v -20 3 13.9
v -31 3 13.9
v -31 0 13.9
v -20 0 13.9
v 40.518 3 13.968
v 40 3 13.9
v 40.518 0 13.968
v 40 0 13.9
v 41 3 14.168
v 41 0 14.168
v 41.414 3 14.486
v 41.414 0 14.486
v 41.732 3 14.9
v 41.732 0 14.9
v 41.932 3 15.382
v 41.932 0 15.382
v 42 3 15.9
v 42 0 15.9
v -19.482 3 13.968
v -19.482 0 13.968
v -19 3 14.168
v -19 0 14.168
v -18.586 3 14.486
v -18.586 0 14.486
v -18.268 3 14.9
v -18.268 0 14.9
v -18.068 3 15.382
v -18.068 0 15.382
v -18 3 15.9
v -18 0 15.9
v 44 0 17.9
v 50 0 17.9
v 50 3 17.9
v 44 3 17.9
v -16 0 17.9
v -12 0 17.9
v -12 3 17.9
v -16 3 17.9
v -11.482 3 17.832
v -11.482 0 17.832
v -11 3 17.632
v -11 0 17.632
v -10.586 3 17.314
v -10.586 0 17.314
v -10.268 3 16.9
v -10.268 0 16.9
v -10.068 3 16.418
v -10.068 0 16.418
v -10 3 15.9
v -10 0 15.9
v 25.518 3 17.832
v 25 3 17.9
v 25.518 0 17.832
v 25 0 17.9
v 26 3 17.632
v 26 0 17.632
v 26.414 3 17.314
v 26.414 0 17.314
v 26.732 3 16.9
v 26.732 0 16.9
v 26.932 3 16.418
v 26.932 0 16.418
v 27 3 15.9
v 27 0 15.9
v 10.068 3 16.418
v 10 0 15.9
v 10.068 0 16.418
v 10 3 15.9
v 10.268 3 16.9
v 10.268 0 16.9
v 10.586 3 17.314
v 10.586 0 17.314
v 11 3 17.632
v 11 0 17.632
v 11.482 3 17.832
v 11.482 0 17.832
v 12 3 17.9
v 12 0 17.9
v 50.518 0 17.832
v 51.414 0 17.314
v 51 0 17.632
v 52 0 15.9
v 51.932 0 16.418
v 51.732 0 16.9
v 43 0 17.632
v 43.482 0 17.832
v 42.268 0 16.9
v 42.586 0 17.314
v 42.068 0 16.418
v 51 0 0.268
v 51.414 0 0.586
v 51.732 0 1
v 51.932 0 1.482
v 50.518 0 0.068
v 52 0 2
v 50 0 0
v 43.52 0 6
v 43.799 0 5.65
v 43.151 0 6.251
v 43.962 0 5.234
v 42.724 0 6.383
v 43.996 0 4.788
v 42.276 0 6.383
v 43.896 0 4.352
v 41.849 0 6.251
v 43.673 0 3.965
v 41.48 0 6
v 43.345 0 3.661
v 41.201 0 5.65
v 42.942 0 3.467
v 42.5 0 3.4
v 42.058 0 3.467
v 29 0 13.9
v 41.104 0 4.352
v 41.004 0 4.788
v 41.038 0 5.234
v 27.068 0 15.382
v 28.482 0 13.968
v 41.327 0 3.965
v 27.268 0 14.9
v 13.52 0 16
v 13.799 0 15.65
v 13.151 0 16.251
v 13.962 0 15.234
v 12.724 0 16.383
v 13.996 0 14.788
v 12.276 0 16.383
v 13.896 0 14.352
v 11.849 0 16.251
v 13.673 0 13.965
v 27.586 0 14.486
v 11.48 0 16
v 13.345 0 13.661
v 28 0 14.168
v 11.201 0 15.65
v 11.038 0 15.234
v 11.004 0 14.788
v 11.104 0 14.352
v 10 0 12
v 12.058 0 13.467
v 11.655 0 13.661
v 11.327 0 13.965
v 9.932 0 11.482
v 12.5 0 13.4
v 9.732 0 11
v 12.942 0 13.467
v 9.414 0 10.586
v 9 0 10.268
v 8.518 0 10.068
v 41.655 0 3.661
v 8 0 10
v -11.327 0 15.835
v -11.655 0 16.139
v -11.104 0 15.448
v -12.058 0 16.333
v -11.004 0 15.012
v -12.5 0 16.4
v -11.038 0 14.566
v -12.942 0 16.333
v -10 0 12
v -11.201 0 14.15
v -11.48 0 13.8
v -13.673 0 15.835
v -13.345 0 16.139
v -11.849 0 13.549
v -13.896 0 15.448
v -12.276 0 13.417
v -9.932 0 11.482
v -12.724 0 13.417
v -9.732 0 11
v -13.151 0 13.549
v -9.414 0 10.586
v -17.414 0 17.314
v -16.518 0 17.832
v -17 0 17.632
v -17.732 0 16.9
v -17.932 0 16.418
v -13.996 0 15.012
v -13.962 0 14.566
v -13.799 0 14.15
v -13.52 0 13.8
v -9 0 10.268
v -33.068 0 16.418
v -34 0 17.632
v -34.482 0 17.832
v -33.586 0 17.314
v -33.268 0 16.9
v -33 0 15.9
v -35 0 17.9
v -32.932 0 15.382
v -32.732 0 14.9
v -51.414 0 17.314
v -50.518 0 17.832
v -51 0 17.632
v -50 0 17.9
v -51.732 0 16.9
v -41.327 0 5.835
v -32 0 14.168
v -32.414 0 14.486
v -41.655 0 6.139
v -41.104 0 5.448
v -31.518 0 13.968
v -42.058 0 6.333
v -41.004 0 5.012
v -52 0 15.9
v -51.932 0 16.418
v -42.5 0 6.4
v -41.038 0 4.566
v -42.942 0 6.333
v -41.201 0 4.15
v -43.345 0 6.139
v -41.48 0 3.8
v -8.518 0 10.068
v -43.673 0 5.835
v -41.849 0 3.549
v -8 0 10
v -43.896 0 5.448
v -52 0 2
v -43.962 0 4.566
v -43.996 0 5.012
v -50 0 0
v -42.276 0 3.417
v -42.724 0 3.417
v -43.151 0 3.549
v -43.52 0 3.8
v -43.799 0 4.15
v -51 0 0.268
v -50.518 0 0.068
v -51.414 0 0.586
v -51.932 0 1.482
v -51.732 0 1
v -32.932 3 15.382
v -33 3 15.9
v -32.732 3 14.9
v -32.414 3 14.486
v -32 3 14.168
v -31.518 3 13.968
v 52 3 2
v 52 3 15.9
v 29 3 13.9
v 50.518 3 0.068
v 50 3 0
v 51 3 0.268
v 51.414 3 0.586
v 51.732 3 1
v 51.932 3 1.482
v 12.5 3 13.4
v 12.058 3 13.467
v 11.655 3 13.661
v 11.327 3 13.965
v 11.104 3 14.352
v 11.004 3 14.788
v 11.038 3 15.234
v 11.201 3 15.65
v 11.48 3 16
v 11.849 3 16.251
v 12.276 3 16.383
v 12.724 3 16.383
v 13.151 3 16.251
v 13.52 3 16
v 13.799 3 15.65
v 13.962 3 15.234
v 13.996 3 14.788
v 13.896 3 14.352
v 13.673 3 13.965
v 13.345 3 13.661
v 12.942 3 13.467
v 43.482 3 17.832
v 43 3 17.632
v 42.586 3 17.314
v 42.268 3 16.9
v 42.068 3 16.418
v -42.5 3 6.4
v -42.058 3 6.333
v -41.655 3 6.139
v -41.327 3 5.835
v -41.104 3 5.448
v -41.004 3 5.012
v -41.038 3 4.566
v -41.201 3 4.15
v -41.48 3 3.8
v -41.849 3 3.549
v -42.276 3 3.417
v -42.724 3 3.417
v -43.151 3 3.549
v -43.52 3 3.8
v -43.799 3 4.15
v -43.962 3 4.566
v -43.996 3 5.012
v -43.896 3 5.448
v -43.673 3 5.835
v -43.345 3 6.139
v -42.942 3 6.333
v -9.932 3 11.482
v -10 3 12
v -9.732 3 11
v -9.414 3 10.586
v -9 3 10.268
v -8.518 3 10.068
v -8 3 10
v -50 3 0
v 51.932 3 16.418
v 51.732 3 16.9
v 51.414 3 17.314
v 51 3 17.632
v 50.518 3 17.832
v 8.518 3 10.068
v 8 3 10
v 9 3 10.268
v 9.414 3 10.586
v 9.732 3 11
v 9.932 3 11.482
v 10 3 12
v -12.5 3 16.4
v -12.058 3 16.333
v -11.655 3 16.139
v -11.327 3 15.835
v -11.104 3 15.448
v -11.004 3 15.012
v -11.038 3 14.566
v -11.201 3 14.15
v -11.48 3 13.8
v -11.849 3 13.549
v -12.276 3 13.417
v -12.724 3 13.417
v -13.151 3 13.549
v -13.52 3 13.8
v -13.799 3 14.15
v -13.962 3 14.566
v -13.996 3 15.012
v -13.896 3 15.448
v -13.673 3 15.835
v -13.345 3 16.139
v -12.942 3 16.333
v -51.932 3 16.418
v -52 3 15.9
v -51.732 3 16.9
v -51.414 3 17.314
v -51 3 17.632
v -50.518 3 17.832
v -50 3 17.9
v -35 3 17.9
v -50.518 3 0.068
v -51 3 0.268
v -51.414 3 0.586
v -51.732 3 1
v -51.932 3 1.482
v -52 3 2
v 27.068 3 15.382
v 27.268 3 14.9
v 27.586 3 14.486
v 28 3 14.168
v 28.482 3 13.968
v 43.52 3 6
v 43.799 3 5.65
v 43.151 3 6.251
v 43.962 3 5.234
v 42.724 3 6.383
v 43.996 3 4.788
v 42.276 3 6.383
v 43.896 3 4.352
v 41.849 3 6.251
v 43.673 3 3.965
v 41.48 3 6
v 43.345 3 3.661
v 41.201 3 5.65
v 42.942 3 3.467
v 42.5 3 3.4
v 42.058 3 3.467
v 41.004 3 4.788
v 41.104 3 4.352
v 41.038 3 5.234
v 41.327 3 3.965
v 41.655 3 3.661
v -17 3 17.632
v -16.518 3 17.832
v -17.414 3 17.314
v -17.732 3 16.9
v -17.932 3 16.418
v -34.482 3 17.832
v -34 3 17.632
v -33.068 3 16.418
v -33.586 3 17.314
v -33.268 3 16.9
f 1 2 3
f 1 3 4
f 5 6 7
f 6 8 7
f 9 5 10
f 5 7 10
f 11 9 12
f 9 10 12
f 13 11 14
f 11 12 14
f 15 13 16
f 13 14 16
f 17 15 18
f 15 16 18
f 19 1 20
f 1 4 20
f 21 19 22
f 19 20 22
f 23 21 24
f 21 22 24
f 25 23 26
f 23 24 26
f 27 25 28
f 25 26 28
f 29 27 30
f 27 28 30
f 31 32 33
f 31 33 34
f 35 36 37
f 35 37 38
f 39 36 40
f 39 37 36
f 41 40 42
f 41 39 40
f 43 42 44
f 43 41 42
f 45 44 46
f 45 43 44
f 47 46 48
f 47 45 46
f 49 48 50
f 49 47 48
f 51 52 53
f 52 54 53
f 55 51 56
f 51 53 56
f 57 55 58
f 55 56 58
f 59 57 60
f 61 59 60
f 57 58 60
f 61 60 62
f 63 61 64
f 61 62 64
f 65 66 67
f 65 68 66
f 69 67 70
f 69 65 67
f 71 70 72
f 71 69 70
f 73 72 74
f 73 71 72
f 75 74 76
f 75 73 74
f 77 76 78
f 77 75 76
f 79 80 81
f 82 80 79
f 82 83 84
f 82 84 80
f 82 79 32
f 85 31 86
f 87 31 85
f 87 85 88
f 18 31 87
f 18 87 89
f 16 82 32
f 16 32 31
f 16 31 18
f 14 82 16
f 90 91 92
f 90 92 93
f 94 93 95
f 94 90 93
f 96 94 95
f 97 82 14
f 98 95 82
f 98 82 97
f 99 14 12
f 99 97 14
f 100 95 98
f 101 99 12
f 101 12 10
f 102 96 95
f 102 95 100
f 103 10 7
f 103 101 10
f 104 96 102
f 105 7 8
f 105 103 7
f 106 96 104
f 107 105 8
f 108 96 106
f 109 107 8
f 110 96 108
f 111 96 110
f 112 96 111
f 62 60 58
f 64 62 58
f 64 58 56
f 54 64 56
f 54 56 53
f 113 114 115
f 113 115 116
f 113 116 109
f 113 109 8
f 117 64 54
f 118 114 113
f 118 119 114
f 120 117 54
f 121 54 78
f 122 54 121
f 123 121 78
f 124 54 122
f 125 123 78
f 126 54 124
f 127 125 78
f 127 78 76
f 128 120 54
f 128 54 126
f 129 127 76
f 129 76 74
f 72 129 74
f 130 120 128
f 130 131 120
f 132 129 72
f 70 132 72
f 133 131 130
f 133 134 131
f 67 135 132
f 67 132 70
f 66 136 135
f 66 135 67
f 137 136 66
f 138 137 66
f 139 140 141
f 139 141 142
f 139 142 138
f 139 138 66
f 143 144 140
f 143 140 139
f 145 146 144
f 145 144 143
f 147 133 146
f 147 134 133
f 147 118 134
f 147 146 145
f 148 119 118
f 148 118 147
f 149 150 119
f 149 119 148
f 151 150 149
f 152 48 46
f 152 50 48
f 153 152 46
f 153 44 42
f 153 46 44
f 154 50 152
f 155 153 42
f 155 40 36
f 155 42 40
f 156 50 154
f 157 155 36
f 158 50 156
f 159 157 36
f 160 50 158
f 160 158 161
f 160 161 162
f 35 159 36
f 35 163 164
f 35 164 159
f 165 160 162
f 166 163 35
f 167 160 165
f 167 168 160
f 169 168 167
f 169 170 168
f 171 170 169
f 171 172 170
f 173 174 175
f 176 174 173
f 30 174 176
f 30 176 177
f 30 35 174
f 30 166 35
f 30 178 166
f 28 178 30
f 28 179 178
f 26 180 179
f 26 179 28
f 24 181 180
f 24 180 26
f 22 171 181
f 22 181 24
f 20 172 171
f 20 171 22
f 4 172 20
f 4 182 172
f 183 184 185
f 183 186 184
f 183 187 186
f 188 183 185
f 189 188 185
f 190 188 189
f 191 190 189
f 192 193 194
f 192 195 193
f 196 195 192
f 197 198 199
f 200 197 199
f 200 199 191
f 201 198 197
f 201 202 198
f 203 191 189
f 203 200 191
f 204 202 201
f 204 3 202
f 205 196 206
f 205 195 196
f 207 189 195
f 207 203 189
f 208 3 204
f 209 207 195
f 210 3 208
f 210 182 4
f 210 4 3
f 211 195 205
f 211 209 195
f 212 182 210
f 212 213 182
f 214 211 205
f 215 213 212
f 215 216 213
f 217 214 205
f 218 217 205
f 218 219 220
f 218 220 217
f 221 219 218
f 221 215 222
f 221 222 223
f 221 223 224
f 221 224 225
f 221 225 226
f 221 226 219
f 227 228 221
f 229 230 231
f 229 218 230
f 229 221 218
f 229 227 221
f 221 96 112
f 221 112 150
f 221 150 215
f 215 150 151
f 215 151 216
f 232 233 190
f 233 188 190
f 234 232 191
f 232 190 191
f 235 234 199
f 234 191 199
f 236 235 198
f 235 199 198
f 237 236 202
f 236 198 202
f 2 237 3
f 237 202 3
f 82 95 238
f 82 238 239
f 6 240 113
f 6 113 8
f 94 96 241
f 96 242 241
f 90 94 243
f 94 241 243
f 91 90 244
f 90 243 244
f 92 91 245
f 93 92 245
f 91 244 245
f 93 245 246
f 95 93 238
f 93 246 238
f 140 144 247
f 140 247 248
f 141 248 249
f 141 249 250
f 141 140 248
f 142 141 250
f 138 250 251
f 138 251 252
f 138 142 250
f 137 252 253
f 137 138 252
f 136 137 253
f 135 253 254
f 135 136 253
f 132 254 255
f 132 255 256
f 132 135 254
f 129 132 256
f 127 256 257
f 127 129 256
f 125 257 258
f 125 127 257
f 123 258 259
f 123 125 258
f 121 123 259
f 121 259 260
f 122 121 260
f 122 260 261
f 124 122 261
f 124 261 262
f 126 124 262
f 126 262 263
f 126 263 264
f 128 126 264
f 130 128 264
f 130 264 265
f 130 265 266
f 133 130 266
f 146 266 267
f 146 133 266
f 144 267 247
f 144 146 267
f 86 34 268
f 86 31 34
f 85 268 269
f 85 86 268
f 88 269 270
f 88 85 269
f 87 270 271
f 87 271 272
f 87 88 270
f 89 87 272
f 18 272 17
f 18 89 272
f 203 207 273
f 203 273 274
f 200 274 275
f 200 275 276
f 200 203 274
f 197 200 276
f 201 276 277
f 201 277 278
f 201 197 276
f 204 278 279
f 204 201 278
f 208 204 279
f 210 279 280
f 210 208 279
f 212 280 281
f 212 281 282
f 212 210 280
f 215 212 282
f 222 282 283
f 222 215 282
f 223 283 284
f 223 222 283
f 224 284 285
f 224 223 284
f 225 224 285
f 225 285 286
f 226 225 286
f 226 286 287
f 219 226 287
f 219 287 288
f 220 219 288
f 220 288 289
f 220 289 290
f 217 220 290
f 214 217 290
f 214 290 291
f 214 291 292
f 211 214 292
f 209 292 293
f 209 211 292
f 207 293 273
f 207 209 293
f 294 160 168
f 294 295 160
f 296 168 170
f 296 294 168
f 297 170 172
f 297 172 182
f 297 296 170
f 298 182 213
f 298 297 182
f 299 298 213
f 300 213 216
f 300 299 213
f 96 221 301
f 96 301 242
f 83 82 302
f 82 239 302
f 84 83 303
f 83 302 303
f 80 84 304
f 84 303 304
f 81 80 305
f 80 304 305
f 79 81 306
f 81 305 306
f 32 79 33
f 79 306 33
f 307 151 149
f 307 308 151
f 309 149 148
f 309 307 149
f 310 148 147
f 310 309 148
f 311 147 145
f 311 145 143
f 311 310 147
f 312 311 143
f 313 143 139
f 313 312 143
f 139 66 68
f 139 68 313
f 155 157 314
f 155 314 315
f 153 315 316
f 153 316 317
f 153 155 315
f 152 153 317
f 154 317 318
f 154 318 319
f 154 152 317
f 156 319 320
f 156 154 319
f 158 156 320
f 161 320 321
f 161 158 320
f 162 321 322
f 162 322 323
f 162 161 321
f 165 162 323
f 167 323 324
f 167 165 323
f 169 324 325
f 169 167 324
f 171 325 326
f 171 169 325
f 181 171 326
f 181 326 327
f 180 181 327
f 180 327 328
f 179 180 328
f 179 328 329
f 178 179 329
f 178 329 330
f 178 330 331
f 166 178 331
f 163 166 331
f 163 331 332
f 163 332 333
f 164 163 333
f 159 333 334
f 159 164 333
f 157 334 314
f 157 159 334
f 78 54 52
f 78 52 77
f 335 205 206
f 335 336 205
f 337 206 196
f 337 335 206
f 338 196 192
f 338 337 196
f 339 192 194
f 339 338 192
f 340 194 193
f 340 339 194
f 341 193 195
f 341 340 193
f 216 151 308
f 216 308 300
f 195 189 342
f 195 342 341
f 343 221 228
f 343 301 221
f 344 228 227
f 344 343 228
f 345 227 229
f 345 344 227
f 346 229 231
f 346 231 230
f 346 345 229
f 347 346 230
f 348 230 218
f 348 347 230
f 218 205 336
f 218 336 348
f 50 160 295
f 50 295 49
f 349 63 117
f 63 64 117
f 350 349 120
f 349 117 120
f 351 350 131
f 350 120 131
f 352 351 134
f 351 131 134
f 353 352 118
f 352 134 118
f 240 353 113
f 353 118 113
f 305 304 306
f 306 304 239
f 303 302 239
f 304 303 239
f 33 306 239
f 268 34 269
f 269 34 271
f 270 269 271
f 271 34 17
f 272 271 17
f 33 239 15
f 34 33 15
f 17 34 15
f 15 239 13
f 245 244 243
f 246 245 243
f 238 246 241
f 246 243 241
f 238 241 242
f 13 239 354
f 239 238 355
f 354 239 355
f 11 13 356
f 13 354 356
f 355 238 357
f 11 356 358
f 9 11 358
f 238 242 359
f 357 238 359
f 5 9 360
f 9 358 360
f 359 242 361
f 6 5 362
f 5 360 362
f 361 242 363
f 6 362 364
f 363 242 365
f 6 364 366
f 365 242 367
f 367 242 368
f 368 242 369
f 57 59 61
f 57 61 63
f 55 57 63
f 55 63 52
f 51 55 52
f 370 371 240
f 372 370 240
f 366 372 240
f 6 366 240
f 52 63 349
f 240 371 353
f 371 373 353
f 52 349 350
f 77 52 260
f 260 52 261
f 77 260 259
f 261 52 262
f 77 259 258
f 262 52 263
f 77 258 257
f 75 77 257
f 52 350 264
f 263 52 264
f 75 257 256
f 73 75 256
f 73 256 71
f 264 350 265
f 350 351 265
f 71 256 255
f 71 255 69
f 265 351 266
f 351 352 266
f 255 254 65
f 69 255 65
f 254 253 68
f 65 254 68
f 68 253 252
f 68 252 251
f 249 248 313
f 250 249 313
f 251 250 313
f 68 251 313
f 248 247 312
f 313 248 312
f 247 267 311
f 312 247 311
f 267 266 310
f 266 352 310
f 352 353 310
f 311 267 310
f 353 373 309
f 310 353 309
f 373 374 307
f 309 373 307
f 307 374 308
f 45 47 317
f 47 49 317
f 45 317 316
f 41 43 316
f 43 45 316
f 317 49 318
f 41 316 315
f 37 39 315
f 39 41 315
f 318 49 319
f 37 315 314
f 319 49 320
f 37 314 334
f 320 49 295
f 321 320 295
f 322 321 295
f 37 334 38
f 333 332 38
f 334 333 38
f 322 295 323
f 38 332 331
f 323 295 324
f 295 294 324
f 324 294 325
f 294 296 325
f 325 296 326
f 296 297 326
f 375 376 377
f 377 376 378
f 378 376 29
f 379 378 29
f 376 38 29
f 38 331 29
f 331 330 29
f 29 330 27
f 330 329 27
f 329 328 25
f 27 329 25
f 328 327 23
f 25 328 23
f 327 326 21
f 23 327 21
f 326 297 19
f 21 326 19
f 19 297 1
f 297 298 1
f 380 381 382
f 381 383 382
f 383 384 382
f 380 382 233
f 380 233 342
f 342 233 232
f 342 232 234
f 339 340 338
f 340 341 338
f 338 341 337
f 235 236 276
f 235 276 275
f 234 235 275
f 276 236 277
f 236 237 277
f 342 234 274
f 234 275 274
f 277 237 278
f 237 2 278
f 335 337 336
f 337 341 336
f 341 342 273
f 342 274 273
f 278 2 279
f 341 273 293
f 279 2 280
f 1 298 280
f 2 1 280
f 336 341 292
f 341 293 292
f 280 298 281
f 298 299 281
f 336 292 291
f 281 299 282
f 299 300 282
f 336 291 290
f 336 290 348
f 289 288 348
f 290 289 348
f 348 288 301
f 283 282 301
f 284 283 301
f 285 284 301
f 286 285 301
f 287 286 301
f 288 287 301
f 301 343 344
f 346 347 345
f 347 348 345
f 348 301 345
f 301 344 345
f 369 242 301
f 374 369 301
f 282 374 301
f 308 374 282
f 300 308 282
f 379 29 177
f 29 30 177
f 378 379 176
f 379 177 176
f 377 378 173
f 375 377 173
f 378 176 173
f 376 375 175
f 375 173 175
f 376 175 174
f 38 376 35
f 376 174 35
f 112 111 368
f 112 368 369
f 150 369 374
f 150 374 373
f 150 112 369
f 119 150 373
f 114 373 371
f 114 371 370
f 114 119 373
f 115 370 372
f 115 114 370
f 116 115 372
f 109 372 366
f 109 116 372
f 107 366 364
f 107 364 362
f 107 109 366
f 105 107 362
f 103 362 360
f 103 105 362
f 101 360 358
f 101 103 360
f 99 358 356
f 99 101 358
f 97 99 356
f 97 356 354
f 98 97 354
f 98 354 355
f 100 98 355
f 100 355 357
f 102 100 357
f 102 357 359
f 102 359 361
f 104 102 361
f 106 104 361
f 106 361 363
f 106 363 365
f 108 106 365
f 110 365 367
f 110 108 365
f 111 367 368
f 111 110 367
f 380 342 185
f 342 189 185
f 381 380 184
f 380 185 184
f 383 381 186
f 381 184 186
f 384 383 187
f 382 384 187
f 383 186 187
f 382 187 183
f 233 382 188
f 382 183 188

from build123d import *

# Parameters (mm, degrees)
SKETCH_1_R          = 1.5
EXTRUDE_1_DEPTH     = 3
SKETCH_2_W          = 15
SKETCH_2_H          = 4
CUT_EXTRUDE_1_DEPTH = 3
FILLET_1_R          = 2


with BuildPart() as part:
    # 草图1 → 凸台-拉伸1 (new body)
    with BuildSketch(Plane(origin=(0, 0, 0), x_dir=(1, 0, 0), z_dir=(0, 1, 0))):
        Polygon((-52, 0), (52, 0), (52, -17.9), (10, -17.9), (10, -10), (-10, -10), (-10, -17.9), (-52, -17.9), align=None)
        with Locations(Location((-12.5, -14.9, 0), (0, 0, 270))):
            Circle(SKETCH_1_R, mode=Mode.SUBTRACT)
        with Locations(Location((12.5, -14.9, 0), (0, 0, 90))):
            Circle(SKETCH_1_R, mode=Mode.SUBTRACT)
        with Locations(Location((-42.5, -4.9, 0), (0, 0, 270))):
            Circle(SKETCH_1_R, mode=Mode.SUBTRACT)
        with Locations(Location((42.5, -4.9, 0), (0, 0, 90))):
            Circle(SKETCH_1_R, mode=Mode.SUBTRACT)
    extrude(amount=EXTRUDE_1_DEPTH)

    # 草图2 → 切除-拉伸1 (cut)
    with BuildSketch(Plane(origin=(0, 3, 0), x_dir=(1, 0, 0), z_dir=(0, 1, 0))):
        with Locations((-25.5, -15.9)):
            Rectangle(SKETCH_2_W, SKETCH_2_H)
        with Locations((34.5, -15.9)):
            Rectangle(SKETCH_2_W, SKETCH_2_H)
    extrude(amount=-CUT_EXTRUDE_1_DEPTH, mode=Mode.SUBTRACT)

    # 圆角1
    fillet_1_edges = [part.edges().sort_by_distance(p)[0] for p in [
        (52, 1.5, 17.9),
        (10, 1.5, 17.9),
        (10, 1.5, 10),
        (-10, 1.5, 10),
        (-10, 1.5, 17.9),
        (-52, 1.5, 17.9),
        (52, 1.5, 0),
        (-52, 1.5, 0),
        (-33, 1.5, 13.9),
        (-18, 1.5, 13.9),
        (-18, 1.5, 17.9),
        (27, 1.5, 17.9),
        (27, 1.5, 13.9),
        (42, 1.5, 13.9),
        (42, 1.5, 17.9),
        (-33, 1.5, 17.9),
    ]]
    fillet(fillet_1_edges, radius=FILLET_1_R - 0.0001)  # a hair under: the kernel refuses the full size


solid = part.part
